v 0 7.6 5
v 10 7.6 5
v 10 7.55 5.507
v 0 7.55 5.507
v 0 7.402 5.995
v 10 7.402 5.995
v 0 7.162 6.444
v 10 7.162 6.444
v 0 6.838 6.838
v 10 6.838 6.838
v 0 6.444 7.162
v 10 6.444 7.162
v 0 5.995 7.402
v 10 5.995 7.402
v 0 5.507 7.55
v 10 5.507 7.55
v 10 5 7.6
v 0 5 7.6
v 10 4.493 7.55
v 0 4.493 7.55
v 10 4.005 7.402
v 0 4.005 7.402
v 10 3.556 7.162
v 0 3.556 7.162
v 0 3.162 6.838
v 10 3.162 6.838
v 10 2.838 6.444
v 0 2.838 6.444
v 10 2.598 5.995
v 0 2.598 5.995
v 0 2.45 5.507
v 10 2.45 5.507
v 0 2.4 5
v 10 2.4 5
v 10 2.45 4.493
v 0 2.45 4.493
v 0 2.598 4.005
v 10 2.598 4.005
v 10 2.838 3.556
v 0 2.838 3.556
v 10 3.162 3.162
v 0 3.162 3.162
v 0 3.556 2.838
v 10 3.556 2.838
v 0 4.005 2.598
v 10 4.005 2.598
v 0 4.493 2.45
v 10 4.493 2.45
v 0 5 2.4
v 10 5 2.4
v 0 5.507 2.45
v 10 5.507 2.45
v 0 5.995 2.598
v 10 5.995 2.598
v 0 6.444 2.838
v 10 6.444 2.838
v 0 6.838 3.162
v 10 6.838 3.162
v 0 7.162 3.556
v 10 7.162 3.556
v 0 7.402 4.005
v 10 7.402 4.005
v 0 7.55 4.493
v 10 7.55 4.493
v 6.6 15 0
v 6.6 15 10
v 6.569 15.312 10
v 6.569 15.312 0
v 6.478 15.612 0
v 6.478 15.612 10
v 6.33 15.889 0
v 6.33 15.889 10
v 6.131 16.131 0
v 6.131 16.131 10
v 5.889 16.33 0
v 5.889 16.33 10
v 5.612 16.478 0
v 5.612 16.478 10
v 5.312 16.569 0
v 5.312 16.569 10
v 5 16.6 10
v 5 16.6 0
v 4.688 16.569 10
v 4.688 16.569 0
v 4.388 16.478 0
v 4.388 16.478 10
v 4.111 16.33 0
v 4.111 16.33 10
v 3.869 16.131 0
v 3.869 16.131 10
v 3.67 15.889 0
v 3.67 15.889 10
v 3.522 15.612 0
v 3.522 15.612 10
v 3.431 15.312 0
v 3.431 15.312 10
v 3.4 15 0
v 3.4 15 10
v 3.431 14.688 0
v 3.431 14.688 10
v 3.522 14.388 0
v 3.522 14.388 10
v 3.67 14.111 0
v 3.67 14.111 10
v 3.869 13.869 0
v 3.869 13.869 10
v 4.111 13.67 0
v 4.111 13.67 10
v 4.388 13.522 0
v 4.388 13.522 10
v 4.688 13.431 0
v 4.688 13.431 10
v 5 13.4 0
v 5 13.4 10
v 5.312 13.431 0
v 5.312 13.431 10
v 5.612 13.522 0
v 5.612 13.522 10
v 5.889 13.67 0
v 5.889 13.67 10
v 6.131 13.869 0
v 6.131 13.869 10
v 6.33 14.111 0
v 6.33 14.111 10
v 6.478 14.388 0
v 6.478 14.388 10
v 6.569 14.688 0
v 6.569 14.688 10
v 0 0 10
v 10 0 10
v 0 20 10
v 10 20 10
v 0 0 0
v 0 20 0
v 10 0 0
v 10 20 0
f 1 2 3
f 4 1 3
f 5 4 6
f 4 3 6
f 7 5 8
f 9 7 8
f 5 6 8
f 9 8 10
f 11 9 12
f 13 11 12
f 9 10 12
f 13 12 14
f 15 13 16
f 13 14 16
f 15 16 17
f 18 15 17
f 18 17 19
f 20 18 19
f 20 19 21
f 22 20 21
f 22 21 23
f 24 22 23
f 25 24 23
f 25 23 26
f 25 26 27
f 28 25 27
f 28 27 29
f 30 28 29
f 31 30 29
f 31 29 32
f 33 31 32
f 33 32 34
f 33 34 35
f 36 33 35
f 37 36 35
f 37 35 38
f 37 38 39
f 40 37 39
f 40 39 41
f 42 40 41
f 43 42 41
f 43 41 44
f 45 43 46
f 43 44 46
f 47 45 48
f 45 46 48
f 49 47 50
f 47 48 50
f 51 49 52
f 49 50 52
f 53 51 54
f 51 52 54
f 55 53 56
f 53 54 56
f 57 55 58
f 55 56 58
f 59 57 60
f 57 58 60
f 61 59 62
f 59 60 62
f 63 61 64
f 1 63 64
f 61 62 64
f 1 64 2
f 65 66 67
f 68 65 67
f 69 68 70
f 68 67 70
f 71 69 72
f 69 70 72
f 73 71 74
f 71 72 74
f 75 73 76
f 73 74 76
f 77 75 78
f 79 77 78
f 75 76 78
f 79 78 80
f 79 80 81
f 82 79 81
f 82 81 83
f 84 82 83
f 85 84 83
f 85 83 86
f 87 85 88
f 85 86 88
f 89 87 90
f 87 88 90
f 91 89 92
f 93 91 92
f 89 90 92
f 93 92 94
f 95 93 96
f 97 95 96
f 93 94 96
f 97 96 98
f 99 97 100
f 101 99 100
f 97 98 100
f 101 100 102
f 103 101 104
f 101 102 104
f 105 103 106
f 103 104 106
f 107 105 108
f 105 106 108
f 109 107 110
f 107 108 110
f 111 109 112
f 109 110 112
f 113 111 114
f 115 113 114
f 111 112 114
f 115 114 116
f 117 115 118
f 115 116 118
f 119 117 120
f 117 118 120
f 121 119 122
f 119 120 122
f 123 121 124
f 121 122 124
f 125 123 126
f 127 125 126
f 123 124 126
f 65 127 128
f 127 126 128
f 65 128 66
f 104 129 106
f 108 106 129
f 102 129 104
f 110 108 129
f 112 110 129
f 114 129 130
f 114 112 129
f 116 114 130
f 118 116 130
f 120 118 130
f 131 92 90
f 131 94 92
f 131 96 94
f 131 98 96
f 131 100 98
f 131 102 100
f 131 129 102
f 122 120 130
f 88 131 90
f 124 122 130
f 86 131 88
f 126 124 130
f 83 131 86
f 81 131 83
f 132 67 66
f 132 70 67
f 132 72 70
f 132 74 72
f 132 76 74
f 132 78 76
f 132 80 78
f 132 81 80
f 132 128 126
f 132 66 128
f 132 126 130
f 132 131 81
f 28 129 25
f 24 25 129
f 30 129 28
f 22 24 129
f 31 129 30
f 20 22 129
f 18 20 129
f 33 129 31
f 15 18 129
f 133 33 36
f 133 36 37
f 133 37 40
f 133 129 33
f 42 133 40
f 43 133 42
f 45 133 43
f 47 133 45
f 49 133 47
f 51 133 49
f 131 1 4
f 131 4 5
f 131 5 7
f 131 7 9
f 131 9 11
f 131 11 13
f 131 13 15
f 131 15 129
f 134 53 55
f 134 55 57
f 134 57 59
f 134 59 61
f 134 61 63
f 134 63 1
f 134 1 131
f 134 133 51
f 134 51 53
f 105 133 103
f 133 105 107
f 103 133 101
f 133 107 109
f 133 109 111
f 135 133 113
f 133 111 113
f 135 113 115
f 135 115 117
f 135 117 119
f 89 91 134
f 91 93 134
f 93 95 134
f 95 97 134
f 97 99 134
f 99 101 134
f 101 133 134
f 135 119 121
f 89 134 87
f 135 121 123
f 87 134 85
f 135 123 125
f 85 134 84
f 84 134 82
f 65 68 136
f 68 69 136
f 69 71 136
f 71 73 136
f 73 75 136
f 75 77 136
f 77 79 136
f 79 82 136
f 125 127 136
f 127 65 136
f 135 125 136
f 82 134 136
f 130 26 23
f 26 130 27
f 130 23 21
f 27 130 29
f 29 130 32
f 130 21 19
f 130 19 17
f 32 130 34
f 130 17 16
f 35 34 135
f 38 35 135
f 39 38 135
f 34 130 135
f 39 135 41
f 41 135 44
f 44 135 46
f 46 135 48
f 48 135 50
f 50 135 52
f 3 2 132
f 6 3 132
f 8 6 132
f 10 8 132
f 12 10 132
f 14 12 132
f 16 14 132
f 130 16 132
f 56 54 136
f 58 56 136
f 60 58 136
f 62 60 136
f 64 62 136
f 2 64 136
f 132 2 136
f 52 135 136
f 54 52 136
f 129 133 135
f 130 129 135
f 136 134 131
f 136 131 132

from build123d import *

# Parameters (mm, degrees)
SKETCH_1_W          = 10
SKETCH_1_H          = 20
EXTRUDE_1_DEPTH     = 10
SKETCH_2_R          = 2.6
CUT_EXTRUDE_1_DEPTH = 25.494897428
SKETCH_3_R          = 1.6
CUT_EXTRUDE_2_DEPTH = 10


with BuildPart() as part:
    # ｽｹｯﾁ1 → ﾎﾞｽ - 押し出し1 (new body)
    with BuildSketch(Plane.XY):
        with Locations((5, 10)):
            Rectangle(SKETCH_1_W, SKETCH_1_H)
    extrude(amount=EXTRUDE_1_DEPTH)

    # ｽｹｯﾁ2 → ｶｯﾄ - 押し出し1 (cut, through all)
    with BuildSketch(Plane(origin=(10, 0, 0), x_dir=(0, 0, -1), z_dir=(1, 0, 0))):
        with Locations(Location((-5, 5, 0), (0, 0, 90))):
            Circle(SKETCH_2_R)
    extrude(amount=-CUT_EXTRUDE_1_DEPTH, mode=Mode.SUBTRACT)

    # ｽｹｯﾁ3 → ｶｯﾄ - 押し出し2 (cut)
    with BuildSketch(Plane.XY.offset(10)):
        with Locations((5, 15)):
            Circle(SKETCH_3_R)
    extrude(amount=-CUT_EXTRUDE_2_DEPTH, mode=Mode.SUBTRACT)


solid = part.part
